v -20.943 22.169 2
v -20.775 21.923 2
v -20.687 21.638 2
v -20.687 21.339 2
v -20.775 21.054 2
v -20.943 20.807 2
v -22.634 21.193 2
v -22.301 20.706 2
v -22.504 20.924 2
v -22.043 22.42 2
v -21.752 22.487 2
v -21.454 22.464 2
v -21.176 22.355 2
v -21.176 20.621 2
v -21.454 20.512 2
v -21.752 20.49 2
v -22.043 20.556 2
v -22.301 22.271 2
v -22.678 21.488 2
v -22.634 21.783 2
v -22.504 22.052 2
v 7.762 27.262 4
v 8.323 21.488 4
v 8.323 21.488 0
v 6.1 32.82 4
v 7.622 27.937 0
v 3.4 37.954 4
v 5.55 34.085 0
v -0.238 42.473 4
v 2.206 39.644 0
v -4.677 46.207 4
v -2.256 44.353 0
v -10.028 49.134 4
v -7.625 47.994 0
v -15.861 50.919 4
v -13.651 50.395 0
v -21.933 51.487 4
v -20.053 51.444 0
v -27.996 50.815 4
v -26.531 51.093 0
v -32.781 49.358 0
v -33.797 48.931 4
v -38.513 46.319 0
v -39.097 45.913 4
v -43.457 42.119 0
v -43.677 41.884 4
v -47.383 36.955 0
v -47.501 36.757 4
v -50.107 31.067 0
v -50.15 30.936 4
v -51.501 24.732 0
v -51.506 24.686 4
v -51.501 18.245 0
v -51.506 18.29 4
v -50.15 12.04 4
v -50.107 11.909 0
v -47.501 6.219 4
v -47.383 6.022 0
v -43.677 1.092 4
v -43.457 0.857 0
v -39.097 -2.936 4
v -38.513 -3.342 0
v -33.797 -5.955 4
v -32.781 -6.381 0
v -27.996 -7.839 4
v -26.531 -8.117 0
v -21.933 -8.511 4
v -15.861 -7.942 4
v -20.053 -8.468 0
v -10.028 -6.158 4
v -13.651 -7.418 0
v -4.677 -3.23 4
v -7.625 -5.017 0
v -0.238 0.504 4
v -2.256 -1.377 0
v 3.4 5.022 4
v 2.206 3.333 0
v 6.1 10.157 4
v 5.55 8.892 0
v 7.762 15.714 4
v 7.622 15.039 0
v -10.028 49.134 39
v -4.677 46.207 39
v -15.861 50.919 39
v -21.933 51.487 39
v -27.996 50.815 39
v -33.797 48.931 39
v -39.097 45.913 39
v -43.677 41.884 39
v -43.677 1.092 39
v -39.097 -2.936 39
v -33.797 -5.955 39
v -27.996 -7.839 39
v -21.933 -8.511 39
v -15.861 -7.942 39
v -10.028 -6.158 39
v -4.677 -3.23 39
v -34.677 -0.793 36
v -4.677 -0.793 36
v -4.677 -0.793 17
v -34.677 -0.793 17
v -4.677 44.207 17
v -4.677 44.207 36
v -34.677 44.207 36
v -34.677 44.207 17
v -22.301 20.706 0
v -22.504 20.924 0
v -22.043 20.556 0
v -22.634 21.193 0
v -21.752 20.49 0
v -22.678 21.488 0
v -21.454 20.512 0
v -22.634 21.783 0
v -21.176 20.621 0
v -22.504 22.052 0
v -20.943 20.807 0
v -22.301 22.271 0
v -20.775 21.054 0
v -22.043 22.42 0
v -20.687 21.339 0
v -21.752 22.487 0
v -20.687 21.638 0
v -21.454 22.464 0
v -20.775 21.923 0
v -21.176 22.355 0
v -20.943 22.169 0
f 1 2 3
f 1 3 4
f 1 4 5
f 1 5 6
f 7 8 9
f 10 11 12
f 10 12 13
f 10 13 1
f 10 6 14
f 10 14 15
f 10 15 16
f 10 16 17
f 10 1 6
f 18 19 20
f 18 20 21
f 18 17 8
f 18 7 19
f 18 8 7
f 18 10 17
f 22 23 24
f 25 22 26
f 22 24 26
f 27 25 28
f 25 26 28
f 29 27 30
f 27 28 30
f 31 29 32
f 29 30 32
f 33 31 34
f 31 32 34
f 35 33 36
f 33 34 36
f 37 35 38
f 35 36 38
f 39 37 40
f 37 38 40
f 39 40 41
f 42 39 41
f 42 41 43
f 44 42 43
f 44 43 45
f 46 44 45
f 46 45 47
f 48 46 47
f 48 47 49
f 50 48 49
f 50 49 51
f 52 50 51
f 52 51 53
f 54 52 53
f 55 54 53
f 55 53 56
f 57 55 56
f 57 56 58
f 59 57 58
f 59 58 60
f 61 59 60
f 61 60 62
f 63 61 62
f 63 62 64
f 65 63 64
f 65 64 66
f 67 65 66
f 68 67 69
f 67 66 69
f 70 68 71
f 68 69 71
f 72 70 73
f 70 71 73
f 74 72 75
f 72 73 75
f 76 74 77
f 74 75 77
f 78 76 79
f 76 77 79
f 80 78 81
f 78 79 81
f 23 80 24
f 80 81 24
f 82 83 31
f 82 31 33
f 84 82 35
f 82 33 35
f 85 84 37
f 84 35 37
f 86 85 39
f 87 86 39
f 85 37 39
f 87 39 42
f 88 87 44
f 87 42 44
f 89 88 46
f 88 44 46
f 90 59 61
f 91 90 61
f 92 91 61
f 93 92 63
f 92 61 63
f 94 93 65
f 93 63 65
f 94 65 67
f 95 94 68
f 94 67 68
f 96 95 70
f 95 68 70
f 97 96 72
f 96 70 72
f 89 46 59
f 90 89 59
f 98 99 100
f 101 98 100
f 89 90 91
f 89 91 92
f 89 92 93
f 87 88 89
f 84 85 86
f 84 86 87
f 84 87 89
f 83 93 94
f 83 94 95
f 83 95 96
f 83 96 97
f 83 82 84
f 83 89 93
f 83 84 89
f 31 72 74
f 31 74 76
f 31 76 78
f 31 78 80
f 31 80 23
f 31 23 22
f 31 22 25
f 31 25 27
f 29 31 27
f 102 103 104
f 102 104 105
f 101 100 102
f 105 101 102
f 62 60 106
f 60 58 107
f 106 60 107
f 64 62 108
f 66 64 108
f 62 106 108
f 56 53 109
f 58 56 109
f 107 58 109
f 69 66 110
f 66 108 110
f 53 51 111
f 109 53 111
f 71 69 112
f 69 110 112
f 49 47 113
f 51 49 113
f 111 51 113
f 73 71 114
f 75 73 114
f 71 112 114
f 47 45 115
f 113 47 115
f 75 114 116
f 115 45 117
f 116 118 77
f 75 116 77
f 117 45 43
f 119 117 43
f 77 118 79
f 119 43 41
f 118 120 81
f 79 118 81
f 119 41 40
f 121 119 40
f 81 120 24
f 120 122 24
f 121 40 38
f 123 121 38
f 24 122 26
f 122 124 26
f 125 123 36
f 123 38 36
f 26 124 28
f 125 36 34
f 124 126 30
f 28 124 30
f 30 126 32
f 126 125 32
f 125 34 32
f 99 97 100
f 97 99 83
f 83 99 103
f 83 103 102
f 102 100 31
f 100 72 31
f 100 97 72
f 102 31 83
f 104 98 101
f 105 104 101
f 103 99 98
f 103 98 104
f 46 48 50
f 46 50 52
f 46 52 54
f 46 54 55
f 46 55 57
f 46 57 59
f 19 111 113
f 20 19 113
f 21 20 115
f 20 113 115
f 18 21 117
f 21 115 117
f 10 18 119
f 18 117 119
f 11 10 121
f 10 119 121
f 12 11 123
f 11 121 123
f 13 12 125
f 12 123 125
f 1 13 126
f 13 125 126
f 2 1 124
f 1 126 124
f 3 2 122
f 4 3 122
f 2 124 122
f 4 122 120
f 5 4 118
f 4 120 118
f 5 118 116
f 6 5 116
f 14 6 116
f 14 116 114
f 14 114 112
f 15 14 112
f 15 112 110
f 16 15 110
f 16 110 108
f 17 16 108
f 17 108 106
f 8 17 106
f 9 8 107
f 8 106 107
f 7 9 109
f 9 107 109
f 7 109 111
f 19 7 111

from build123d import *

# Parameters (mm, degrees)
ESQUISSE1_R             = 30
BOSS_EXTRU_1_DEPTH      = 4
BOSS_EXTRU_3_DEPTH      = 35
ESQUISSE7_W             = 19
ESQUISSE7_H             = 45
ENL_V_MAT_EXTRU_1_DEPTH = 30
ESQUISSE8_R             = 1.001210448
ENL_V_MAT_EXTRU_2_DEPTH = 2


with BuildPart() as part:
    # Esquisse1 → Boss.-Extru.1 (new body)
    with BuildSketch(Plane.XY):
        with Locations((-21.677103804, 21.48828033)):
            Circle(ESQUISSE1_R)
    extrude(amount=BOSS_EXTRU_1_DEPTH)

    # Esquisse4 → Boss.-Extru.3 (add)
    with BuildSketch(Plane.XY.offset(4)):
        with BuildLine():
            Line((-43.677103804, 41.884358384), (-43.677103804, 21.48828033))
            Line((-43.677103804, 21.48828033), (-43.677103804, 1.092202275))
            ThreePointArc((-43.677103804, 1.092202275), (-24.981744089, -8.329153372), (-4.677103804, -3.230133859))
            Line((-4.677103804, -3.230133859), (-4.677103804, 46.206694518))
            ThreePointArc((-4.677103804, 46.206694518), (-24.981744089, 51.305714032), (-43.677103804, 41.884358384))
        make_face()
    extrude(amount=BOSS_EXTRU_3_DEPTH)

    # Esquisse7 → Enlèv. mat.-Extru.1 (cut)
    with BuildSketch(Plane(origin=(-4.677103804, 0, 0), x_dir=(0, 0, -1), z_dir=(1, 0, 0))):
        with Locations((-26.5, 21.706694518)):
            Rectangle(ESQUISSE7_W, ESQUISSE7_H)
    extrude(amount=-ENL_V_MAT_EXTRU_1_DEPTH, mode=Mode.SUBTRACT)

    # Esquisse8 → Enlèv. mat.-Extru.2 (cut)
    with BuildSketch(Plane(origin=(0, 0, 0), x_dir=(-1, 0, 0), z_dir=(0, 0, -1))):
        with Locations((21.677103804, 21.48828033)):
            Circle(ESQUISSE8_R)
    extrude(amount=-ENL_V_MAT_EXTRU_2_DEPTH, mode=Mode.SUBTRACT)


solid = part.part
